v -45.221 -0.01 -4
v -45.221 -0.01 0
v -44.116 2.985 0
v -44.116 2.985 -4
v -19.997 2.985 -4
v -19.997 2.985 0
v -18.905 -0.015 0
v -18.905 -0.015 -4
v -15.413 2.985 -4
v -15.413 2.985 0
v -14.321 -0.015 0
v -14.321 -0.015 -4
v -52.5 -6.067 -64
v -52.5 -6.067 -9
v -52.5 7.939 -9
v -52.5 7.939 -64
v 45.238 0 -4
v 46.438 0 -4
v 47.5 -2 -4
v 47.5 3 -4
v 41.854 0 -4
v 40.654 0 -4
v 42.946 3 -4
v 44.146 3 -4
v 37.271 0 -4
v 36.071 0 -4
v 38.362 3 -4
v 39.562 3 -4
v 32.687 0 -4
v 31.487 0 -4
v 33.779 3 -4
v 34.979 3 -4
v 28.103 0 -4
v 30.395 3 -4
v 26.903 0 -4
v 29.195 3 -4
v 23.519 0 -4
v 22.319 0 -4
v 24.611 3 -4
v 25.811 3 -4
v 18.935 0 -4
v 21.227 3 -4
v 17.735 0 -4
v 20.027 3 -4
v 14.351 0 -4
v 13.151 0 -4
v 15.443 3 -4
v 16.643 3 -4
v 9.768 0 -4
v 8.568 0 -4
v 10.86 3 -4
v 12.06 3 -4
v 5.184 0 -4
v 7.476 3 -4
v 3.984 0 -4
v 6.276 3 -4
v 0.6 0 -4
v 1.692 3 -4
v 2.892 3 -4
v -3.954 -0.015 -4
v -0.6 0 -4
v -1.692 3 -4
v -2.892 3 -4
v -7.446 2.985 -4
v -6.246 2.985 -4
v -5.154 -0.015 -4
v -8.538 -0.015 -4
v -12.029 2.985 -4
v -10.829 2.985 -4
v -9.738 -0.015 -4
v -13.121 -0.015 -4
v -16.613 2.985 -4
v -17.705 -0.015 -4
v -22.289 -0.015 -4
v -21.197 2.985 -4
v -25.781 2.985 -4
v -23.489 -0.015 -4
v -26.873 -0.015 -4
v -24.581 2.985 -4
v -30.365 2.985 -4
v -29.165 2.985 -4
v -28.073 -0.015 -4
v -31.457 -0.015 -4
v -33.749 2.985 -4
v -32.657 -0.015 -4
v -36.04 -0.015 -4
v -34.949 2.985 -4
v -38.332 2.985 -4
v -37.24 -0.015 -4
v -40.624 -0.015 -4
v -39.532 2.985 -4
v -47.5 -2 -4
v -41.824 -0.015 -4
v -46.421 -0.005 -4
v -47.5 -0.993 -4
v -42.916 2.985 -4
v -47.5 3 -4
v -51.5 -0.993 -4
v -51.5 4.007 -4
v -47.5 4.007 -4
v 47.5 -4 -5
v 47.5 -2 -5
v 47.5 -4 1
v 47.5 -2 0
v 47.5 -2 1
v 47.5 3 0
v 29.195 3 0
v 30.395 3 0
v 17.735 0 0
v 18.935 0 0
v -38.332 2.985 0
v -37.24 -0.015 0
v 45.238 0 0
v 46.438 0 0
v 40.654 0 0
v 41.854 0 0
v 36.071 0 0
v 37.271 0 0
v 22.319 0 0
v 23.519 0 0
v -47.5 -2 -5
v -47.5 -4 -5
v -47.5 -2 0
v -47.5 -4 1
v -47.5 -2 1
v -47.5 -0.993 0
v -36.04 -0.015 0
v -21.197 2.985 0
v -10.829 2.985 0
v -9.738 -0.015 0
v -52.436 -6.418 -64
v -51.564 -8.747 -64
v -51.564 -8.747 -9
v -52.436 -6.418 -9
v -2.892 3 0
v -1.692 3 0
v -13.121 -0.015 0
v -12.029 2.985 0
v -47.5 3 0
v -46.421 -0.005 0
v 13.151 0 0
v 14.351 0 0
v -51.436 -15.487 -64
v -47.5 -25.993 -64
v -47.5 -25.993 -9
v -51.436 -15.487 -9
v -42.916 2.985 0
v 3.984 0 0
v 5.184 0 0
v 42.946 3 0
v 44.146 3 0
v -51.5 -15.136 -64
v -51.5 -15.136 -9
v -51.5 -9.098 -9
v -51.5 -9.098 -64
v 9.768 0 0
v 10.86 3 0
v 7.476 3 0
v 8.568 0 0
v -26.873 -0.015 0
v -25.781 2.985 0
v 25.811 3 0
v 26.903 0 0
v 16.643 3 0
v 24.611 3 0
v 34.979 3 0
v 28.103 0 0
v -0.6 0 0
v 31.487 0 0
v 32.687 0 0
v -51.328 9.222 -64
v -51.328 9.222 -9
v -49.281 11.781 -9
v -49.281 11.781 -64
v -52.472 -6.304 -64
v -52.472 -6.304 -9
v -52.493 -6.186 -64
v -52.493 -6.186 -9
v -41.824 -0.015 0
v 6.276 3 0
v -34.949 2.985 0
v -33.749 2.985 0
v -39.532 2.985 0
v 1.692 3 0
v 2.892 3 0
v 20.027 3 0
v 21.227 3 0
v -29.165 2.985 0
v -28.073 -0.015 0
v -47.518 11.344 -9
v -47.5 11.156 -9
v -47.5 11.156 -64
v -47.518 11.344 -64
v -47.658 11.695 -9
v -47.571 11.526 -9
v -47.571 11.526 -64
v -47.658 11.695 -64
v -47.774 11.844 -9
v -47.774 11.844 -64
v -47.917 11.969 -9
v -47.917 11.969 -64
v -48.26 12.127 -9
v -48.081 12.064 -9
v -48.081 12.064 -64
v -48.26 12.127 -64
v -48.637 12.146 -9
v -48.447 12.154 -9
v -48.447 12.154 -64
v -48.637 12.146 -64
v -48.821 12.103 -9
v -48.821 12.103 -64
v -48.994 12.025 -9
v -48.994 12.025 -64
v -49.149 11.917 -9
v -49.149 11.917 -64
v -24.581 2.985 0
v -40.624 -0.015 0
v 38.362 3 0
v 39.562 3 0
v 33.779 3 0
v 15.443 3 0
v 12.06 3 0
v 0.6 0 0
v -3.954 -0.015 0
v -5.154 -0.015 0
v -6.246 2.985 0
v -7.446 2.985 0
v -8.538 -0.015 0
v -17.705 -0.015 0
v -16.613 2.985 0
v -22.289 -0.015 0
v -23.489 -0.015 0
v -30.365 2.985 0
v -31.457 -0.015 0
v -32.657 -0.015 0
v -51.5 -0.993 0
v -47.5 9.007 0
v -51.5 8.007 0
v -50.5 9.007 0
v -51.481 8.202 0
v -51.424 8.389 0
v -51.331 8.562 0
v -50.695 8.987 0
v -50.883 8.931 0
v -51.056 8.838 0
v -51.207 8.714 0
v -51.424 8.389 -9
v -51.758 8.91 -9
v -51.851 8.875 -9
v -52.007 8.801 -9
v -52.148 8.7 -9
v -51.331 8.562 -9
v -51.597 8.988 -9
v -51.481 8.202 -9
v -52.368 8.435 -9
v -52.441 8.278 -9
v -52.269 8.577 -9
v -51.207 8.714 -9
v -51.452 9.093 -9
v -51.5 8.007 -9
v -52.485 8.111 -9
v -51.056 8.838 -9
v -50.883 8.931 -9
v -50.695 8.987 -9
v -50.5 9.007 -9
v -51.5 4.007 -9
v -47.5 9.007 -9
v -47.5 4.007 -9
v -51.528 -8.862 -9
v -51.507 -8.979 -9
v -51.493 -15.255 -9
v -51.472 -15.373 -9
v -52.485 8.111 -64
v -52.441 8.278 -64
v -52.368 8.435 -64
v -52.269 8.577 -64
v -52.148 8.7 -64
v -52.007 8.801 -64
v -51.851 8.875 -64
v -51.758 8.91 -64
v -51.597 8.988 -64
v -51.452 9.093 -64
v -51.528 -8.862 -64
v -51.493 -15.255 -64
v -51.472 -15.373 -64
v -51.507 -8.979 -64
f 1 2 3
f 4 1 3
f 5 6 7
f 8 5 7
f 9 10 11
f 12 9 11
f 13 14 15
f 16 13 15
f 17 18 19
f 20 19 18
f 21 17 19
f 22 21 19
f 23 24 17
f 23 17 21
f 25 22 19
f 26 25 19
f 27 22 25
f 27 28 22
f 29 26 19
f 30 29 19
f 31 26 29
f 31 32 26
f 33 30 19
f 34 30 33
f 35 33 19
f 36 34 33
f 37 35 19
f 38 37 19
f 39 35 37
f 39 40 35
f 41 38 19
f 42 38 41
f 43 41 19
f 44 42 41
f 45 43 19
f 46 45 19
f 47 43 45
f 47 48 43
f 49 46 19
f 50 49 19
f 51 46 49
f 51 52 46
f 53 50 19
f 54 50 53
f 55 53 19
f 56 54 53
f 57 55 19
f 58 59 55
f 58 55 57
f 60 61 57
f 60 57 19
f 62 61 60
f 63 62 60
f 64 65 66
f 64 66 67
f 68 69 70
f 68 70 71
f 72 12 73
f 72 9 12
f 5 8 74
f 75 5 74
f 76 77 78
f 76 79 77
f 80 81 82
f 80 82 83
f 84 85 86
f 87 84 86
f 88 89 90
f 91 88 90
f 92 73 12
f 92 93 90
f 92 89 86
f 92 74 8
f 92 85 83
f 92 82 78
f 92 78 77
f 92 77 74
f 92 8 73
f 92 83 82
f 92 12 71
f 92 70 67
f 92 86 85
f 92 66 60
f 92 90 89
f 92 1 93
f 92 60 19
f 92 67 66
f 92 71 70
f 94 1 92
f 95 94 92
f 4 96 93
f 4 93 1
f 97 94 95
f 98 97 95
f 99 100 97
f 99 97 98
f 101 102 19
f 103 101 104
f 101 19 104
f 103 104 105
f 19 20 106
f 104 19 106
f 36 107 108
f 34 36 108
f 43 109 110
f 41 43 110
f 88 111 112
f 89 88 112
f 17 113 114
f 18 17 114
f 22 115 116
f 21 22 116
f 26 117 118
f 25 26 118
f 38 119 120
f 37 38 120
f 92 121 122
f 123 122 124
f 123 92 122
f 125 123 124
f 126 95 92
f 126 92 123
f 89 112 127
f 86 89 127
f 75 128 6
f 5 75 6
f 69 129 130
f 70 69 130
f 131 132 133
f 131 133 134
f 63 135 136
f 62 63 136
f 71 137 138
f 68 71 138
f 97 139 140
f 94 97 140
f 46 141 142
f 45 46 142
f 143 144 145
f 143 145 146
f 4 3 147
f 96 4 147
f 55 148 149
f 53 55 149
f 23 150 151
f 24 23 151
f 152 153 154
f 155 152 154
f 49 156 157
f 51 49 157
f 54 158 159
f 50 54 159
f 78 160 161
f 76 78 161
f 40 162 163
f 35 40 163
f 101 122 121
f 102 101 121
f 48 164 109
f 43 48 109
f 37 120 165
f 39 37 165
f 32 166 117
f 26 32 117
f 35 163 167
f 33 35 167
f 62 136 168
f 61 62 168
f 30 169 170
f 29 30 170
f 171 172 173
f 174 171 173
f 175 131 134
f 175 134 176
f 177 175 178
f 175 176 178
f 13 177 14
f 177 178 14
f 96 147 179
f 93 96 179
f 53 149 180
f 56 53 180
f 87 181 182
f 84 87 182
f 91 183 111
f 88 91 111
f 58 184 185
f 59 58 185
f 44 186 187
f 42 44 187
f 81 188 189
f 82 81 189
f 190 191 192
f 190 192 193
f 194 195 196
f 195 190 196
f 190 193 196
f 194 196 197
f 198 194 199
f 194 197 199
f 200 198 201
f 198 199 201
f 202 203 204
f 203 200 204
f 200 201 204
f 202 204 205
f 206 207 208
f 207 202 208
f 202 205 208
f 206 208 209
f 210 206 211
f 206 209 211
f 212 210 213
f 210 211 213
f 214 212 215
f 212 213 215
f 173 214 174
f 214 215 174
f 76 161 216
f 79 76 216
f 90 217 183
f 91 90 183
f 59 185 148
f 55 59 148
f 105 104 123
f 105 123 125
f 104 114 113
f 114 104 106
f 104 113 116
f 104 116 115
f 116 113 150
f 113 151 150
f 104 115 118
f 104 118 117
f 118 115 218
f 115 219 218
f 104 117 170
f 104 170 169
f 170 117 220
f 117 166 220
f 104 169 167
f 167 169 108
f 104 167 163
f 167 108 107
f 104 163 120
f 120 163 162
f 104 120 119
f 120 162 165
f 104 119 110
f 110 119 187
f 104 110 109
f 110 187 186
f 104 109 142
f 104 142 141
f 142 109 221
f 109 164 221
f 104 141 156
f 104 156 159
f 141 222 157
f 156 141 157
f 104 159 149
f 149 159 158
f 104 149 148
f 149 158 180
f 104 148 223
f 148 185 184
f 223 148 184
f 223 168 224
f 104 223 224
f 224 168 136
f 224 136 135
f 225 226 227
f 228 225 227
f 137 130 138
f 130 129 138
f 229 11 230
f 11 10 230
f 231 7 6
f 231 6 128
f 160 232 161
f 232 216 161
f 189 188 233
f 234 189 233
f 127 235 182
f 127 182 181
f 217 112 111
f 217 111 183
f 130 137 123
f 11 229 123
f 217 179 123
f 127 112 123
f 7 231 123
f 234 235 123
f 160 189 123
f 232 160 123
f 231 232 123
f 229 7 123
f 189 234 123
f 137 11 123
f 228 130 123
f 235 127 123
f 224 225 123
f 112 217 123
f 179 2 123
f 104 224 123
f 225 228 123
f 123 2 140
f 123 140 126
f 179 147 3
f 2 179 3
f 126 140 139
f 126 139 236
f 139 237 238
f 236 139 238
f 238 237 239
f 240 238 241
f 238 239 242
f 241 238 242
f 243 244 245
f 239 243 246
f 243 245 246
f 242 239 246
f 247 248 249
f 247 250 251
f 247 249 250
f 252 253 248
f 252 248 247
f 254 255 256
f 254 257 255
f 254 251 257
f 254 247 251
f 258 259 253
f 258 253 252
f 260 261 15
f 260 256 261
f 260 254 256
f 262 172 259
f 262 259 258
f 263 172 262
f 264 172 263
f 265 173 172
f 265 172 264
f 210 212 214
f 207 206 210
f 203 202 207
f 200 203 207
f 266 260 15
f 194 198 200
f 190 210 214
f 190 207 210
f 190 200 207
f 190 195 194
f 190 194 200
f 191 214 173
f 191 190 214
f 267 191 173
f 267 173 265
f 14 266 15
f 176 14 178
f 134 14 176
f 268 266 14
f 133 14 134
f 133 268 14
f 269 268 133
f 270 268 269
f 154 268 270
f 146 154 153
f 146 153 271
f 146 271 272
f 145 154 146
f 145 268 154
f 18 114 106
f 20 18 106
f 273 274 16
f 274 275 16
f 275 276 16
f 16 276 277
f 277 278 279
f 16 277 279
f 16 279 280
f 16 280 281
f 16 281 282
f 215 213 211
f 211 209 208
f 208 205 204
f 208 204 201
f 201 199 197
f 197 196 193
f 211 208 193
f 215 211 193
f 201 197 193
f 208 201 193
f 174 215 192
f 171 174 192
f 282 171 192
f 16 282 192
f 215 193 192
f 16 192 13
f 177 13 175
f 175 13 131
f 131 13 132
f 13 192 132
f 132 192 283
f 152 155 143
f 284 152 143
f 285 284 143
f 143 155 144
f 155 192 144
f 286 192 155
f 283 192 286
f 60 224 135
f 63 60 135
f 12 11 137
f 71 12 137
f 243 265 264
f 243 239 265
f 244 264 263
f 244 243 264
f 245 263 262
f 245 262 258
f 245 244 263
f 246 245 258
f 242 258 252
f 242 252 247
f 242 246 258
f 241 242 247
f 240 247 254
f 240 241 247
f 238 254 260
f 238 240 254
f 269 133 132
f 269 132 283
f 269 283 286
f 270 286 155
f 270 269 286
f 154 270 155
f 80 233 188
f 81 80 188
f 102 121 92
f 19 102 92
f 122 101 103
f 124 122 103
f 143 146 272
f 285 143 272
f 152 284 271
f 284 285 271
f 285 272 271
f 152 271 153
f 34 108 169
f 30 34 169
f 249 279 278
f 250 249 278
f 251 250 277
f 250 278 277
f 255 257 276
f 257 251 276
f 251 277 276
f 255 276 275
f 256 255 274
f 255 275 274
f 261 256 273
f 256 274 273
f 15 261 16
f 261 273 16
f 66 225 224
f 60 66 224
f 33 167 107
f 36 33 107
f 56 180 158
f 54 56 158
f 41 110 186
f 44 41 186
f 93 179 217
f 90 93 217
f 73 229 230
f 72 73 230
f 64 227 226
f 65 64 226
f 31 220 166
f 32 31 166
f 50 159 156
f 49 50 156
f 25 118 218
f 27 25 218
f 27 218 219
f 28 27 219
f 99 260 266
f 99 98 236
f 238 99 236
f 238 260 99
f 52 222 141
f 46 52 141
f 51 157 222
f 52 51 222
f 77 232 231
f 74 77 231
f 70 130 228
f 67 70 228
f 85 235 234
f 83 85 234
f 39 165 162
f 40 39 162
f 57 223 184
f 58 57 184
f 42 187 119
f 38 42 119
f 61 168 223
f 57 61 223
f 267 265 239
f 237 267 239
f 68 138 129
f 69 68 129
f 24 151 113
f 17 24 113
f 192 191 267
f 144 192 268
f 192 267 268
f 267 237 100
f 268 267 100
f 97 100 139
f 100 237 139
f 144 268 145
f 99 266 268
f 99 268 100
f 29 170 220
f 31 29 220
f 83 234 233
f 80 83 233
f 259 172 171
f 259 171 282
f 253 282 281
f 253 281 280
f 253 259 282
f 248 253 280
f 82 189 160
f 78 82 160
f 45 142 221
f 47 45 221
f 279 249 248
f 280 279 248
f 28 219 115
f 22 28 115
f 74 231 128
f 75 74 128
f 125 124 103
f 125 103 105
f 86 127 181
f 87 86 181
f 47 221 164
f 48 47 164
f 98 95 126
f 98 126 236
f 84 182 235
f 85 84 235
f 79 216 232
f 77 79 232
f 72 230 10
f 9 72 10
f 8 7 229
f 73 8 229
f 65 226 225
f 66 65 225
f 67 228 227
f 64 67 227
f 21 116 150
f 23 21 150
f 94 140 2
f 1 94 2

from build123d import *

# Parameters (mm, degrees)
BOSS_EXTRU_2_DEPTH      = 4
ESQUISSE5_W             = 1
ESQUISSE5_H             = 2
BOSS_EXTRU_3_DEPTH      = 95
ESQUISSE6_W             = 4
ESQUISSE6_H             = 10
BOSS_EXTRU_4_DEPTH      = 4
ESQUISSE7_W             = 10
ESQUISSE7_H             = 5
BOSS_EXTRU_5_DEPTH      = 4
BOSS_EXTRU_6_DEPTH      = 50
BOSS_EXTRU_6_DEPTH_BACK = 5
CONG_1_R                = 1
CONG_2_R                = 1


with BuildPart() as part:
    # Esquisse2 → Boss.-Extru.2 (new body)
    with BuildSketch(Plane.XY):
        Polygon((-0.6, 0), (0.6, 0), (1.691910703, 3), (2.891910703, 3), (3.983821406, 0), (5.183821406, 0), (6.275732108, 3), (7.475732108, 3), (8.567642811, 0), (9.767642811, 0), (10.859553514, 3), (12.059553514, 3), (13.151464217, 0), (14.351464217, 0), (15.44337492, 3), (16.64337492, 3), (17.735285622, 0), (18.935285622, 0), (20.027196325, 3), (21.227196325, 3), (22.319107028, 0), (23.519107028, 0), (24.611017731, 3), (25.811017731, 3), (26.902928434, 0), (28.102928434, 0), (29.194839136, 3), (30.394839136, 3), (31.486749839, 0), (32.686749839, 0), (33.778660542, 3), (34.978660542, 3), (36.070571245, 0), (37.270571245, 0), (38.362481948, 3), (39.562481948, 3), (40.65439265, 0), (41.85439265, 0), (42.946303353, 3), (44.146303353, 3), (45.238214056, 0), (46.438214056, 0), (47.5, 3.000064821), (47.5, -4), (-47.5, -4), (-47.5, 3), (-46.4210099, -0.004671254), (-45.221021012, -0.009835451), (-44.116209929, 2.985437734), (-42.916209929, 2.985437734), (-41.824299226, -0.014562266), (-40.624299226, -0.014562266), (-39.532388523, 2.985437734), (-38.332388523, 2.985437734), (-37.24047782, -0.014562266), (-36.04047782, -0.014562266), (-34.948567118, 2.985437734), (-33.748567118, 2.985437734), (-32.656656415, -0.014562266), (-31.456656415, -0.014562266), (-30.364745712, 2.985437734), (-29.164745712, 2.985437734), (-28.072835009, -0.014562266), (-26.872835009, -0.014562266), (-25.780924306, 2.985437734), (-24.580924306, 2.985437734), (-23.489013604, -0.014562266), (-22.289013604, -0.014562266), (-21.197102901, 2.985437734), (-19.997102901, 2.985437734), (-18.905192198, -0.014562266), (-17.705192198, -0.014562266), (-16.613281495, 2.985437734), (-15.413281495, 2.985437734), (-14.321370793, -0.014562266), (-13.121370793, -0.014562266), (-12.02946009, 2.985437734), (-10.82946009, 2.985437734), (-9.737549387, -0.014562266), (-8.537549387, -0.014562266), (-7.445638684, 2.985437734), (-6.245638684, 2.985437734), (-5.153727981, -0.014562266), (-3.953727981, -0.014562266), (-2.891910703, 3), (-1.691910703, 3), align=None)
    extrude(amount=-BOSS_EXTRU_2_DEPTH)

    # Esquisse5 → Boss.-Extru.3 (add)
    with BuildSketch(Plane.ZY.offset(47.5)):
        with Locations((0.5, -3)):
            Rectangle(ESQUISSE5_W, ESQUISSE5_H)
        with Locations((-4.5, -3)):
            Rectangle(ESQUISSE5_W, ESQUISSE5_H)
    extrude(amount=-BOSS_EXTRU_3_DEPTH)

    # Esquisse6 → Boss.-Extru.4 (add)
    with BuildSketch(Plane(origin=(0, 0, -4), x_dir=(-1, 0, 0), z_dir=(0, 0, -1))):
        with Locations((49.5, 4.006649999)):
            Rectangle(ESQUISSE6_W, ESQUISSE6_H)
    extrude(amount=-BOSS_EXTRU_4_DEPTH)

    # Esquisse7 → Boss.-Extru.5 (add)
    with BuildSketch(Plane.ZY.offset(51.5)):
        with Locations((-9, 6.506649999)):
            Rectangle(ESQUISSE7_W, ESQUISSE7_H)
    extrude(amount=-BOSS_EXTRU_5_DEPTH)

    # Esquisse8 → Boss.-Extru.6 (add, two sides: drawn at the far end of the back side and taken through both)
    with BuildSketch(Plane(origin=(0, 0, -14), x_dir=(-1, 0, 0), z_dir=(0, 0, -1)).offset(-BOSS_EXTRU_6_DEPTH_BACK)):
        Polygon((47.5, 14.006649999), (47.5, -25.993350001), (51.5, -15.317080155), (51.5, -8.917080155), (52.5, -6.248012693), (52.5, 8.631987307), (51.5, 9.006649999), align=None)
    extrude(amount=BOSS_EXTRU_6_DEPTH + BOSS_EXTRU_6_DEPTH_BACK)

    # Congé1
    # the kernel refuses this fillet: 1 mm, written as the material it adds along each edge
    with BuildSketch(Plane(origin=(-51.5, 9.006649999, -9), x_dir=(0.6246950475544211, 0.7808688094430328, 0), z_dir=(0, 0, -1))) as cong_1_piece_1:
        with BuildLine():
            CenterArc((CONG_1_R * 0.275456143741, -CONG_1_R), CONG_1_R, 90, 30.801092038)
            Line((-CONG_1_R * 0.236603092518, -CONG_1_R * 0.141049862587), (0, 0))
            Line((0, 0), (CONG_1_R * 0.275456143741, 0))
        make_face()
    extrude(amount=55)
    with BuildSketch(Plane(origin=(-51.5, -8.917080155, -9), x_dir=(-0.35084650222761954, 0.9364329831197985, 0), z_dir=(0, 0, -1))) as cong_1_piece_2:
        with BuildLine():
            CenterArc((CONG_1_R * 0.18118184584, -CONG_1_R), CONG_1_R, 90, 20.539099708)
            Line((-CONG_1_R * 0.169664656387, -CONG_1_R * 0.0635670168802), (0, 0))
            Line((0, 0), (CONG_1_R * 0.18118184584, 0))
        make_face()
    extrude(amount=55)
    # the kernel refuses this fillet: 1 mm, written as the material it takes off along each edge
    with BuildSketch(Plane(origin=(-47.5, 14.006649999, -71.126952648), x_dir=(0, -1, 0), z_dir=(0, 0, 1))) as cong_1_2_piece_1:
        with BuildLine():
            CenterArc((CONG_1_R * 2.85078105936, -CONG_1_R), CONG_1_R, 90, 141.340191746)
            Line((CONG_1_R * 2.2260860118, -CONG_1_R * 1.78086880944), (0, 0))
            Line((0, 0), (CONG_1_R * 2.85078105936, 0))
        make_face()
    extrude(amount=69.253905297, mode=Mode.SUBTRACT)
    with BuildSketch(Plane(origin=(-52.5, 8.631987307, -65.733048465), x_dir=(0.9364329831198017, 0.35084650222761105, 0), z_dir=(0, 0, 1))) as cong_1_2_piece_2:
        with BuildLine():
            CenterArc((CONG_1_R * 0.693219386196, -CONG_1_R), CONG_1_R, 90, 69.460900292)
            Line((-CONG_1_R * 0.243213596923, -CONG_1_R * 0.649153497772), (0, 0))
            Line((0, 0), (CONG_1_R * 0.693219386196, 0))
        make_face()
    extrude(amount=58.466096931, mode=Mode.SUBTRACT)
    with BuildSketch(Plane(origin=(-52.5, -6.248012693, -8.547045385), x_dir=(0, 1, 0), z_dir=(0, 0, -1))) as cong_1_2_piece_3:
        with BuildLine():
            CenterArc((CONG_1_R * 0.18118184584, CONG_1_R), CONG_1_R, 249.460900292, 20.539099708)
            Line((-CONG_1_R * 0.169664656387, CONG_1_R * 0.0635670168802), (0, 0))
            Line((0, 0), (CONG_1_R * 0.18118184584, 0))
        make_face()
    extrude(amount=55.905909229, mode=Mode.SUBTRACT)
    with BuildSketch(Plane(origin=(-51.5, -15.317080155, -8.547045385), x_dir=(0.35084650222762276, -0.9364329831197973, 0), z_dir=(0, 0, -1))) as cong_1_2_piece_4:
        with BuildLine():
            CenterArc((CONG_1_R * 0.18118184584, -CONG_1_R), CONG_1_R, 90, 20.539099708)
            Line((-CONG_1_R * 0.169664656387, -CONG_1_R * 0.0635670168802), (0, 0))
            Line((0, 0), (CONG_1_R * 0.18118184584, 0))
        make_face()
    extrude(amount=55.905909229, mode=Mode.SUBTRACT)

    # Congé2
    cong_2_edges = [part.edges().sort_by_distance(p)[0] for p in [
        (-51.5, 9.006649999, -4.5),
    ]]
    fillet(cong_2_edges, radius=CONG_2_R)


solid = part.part
